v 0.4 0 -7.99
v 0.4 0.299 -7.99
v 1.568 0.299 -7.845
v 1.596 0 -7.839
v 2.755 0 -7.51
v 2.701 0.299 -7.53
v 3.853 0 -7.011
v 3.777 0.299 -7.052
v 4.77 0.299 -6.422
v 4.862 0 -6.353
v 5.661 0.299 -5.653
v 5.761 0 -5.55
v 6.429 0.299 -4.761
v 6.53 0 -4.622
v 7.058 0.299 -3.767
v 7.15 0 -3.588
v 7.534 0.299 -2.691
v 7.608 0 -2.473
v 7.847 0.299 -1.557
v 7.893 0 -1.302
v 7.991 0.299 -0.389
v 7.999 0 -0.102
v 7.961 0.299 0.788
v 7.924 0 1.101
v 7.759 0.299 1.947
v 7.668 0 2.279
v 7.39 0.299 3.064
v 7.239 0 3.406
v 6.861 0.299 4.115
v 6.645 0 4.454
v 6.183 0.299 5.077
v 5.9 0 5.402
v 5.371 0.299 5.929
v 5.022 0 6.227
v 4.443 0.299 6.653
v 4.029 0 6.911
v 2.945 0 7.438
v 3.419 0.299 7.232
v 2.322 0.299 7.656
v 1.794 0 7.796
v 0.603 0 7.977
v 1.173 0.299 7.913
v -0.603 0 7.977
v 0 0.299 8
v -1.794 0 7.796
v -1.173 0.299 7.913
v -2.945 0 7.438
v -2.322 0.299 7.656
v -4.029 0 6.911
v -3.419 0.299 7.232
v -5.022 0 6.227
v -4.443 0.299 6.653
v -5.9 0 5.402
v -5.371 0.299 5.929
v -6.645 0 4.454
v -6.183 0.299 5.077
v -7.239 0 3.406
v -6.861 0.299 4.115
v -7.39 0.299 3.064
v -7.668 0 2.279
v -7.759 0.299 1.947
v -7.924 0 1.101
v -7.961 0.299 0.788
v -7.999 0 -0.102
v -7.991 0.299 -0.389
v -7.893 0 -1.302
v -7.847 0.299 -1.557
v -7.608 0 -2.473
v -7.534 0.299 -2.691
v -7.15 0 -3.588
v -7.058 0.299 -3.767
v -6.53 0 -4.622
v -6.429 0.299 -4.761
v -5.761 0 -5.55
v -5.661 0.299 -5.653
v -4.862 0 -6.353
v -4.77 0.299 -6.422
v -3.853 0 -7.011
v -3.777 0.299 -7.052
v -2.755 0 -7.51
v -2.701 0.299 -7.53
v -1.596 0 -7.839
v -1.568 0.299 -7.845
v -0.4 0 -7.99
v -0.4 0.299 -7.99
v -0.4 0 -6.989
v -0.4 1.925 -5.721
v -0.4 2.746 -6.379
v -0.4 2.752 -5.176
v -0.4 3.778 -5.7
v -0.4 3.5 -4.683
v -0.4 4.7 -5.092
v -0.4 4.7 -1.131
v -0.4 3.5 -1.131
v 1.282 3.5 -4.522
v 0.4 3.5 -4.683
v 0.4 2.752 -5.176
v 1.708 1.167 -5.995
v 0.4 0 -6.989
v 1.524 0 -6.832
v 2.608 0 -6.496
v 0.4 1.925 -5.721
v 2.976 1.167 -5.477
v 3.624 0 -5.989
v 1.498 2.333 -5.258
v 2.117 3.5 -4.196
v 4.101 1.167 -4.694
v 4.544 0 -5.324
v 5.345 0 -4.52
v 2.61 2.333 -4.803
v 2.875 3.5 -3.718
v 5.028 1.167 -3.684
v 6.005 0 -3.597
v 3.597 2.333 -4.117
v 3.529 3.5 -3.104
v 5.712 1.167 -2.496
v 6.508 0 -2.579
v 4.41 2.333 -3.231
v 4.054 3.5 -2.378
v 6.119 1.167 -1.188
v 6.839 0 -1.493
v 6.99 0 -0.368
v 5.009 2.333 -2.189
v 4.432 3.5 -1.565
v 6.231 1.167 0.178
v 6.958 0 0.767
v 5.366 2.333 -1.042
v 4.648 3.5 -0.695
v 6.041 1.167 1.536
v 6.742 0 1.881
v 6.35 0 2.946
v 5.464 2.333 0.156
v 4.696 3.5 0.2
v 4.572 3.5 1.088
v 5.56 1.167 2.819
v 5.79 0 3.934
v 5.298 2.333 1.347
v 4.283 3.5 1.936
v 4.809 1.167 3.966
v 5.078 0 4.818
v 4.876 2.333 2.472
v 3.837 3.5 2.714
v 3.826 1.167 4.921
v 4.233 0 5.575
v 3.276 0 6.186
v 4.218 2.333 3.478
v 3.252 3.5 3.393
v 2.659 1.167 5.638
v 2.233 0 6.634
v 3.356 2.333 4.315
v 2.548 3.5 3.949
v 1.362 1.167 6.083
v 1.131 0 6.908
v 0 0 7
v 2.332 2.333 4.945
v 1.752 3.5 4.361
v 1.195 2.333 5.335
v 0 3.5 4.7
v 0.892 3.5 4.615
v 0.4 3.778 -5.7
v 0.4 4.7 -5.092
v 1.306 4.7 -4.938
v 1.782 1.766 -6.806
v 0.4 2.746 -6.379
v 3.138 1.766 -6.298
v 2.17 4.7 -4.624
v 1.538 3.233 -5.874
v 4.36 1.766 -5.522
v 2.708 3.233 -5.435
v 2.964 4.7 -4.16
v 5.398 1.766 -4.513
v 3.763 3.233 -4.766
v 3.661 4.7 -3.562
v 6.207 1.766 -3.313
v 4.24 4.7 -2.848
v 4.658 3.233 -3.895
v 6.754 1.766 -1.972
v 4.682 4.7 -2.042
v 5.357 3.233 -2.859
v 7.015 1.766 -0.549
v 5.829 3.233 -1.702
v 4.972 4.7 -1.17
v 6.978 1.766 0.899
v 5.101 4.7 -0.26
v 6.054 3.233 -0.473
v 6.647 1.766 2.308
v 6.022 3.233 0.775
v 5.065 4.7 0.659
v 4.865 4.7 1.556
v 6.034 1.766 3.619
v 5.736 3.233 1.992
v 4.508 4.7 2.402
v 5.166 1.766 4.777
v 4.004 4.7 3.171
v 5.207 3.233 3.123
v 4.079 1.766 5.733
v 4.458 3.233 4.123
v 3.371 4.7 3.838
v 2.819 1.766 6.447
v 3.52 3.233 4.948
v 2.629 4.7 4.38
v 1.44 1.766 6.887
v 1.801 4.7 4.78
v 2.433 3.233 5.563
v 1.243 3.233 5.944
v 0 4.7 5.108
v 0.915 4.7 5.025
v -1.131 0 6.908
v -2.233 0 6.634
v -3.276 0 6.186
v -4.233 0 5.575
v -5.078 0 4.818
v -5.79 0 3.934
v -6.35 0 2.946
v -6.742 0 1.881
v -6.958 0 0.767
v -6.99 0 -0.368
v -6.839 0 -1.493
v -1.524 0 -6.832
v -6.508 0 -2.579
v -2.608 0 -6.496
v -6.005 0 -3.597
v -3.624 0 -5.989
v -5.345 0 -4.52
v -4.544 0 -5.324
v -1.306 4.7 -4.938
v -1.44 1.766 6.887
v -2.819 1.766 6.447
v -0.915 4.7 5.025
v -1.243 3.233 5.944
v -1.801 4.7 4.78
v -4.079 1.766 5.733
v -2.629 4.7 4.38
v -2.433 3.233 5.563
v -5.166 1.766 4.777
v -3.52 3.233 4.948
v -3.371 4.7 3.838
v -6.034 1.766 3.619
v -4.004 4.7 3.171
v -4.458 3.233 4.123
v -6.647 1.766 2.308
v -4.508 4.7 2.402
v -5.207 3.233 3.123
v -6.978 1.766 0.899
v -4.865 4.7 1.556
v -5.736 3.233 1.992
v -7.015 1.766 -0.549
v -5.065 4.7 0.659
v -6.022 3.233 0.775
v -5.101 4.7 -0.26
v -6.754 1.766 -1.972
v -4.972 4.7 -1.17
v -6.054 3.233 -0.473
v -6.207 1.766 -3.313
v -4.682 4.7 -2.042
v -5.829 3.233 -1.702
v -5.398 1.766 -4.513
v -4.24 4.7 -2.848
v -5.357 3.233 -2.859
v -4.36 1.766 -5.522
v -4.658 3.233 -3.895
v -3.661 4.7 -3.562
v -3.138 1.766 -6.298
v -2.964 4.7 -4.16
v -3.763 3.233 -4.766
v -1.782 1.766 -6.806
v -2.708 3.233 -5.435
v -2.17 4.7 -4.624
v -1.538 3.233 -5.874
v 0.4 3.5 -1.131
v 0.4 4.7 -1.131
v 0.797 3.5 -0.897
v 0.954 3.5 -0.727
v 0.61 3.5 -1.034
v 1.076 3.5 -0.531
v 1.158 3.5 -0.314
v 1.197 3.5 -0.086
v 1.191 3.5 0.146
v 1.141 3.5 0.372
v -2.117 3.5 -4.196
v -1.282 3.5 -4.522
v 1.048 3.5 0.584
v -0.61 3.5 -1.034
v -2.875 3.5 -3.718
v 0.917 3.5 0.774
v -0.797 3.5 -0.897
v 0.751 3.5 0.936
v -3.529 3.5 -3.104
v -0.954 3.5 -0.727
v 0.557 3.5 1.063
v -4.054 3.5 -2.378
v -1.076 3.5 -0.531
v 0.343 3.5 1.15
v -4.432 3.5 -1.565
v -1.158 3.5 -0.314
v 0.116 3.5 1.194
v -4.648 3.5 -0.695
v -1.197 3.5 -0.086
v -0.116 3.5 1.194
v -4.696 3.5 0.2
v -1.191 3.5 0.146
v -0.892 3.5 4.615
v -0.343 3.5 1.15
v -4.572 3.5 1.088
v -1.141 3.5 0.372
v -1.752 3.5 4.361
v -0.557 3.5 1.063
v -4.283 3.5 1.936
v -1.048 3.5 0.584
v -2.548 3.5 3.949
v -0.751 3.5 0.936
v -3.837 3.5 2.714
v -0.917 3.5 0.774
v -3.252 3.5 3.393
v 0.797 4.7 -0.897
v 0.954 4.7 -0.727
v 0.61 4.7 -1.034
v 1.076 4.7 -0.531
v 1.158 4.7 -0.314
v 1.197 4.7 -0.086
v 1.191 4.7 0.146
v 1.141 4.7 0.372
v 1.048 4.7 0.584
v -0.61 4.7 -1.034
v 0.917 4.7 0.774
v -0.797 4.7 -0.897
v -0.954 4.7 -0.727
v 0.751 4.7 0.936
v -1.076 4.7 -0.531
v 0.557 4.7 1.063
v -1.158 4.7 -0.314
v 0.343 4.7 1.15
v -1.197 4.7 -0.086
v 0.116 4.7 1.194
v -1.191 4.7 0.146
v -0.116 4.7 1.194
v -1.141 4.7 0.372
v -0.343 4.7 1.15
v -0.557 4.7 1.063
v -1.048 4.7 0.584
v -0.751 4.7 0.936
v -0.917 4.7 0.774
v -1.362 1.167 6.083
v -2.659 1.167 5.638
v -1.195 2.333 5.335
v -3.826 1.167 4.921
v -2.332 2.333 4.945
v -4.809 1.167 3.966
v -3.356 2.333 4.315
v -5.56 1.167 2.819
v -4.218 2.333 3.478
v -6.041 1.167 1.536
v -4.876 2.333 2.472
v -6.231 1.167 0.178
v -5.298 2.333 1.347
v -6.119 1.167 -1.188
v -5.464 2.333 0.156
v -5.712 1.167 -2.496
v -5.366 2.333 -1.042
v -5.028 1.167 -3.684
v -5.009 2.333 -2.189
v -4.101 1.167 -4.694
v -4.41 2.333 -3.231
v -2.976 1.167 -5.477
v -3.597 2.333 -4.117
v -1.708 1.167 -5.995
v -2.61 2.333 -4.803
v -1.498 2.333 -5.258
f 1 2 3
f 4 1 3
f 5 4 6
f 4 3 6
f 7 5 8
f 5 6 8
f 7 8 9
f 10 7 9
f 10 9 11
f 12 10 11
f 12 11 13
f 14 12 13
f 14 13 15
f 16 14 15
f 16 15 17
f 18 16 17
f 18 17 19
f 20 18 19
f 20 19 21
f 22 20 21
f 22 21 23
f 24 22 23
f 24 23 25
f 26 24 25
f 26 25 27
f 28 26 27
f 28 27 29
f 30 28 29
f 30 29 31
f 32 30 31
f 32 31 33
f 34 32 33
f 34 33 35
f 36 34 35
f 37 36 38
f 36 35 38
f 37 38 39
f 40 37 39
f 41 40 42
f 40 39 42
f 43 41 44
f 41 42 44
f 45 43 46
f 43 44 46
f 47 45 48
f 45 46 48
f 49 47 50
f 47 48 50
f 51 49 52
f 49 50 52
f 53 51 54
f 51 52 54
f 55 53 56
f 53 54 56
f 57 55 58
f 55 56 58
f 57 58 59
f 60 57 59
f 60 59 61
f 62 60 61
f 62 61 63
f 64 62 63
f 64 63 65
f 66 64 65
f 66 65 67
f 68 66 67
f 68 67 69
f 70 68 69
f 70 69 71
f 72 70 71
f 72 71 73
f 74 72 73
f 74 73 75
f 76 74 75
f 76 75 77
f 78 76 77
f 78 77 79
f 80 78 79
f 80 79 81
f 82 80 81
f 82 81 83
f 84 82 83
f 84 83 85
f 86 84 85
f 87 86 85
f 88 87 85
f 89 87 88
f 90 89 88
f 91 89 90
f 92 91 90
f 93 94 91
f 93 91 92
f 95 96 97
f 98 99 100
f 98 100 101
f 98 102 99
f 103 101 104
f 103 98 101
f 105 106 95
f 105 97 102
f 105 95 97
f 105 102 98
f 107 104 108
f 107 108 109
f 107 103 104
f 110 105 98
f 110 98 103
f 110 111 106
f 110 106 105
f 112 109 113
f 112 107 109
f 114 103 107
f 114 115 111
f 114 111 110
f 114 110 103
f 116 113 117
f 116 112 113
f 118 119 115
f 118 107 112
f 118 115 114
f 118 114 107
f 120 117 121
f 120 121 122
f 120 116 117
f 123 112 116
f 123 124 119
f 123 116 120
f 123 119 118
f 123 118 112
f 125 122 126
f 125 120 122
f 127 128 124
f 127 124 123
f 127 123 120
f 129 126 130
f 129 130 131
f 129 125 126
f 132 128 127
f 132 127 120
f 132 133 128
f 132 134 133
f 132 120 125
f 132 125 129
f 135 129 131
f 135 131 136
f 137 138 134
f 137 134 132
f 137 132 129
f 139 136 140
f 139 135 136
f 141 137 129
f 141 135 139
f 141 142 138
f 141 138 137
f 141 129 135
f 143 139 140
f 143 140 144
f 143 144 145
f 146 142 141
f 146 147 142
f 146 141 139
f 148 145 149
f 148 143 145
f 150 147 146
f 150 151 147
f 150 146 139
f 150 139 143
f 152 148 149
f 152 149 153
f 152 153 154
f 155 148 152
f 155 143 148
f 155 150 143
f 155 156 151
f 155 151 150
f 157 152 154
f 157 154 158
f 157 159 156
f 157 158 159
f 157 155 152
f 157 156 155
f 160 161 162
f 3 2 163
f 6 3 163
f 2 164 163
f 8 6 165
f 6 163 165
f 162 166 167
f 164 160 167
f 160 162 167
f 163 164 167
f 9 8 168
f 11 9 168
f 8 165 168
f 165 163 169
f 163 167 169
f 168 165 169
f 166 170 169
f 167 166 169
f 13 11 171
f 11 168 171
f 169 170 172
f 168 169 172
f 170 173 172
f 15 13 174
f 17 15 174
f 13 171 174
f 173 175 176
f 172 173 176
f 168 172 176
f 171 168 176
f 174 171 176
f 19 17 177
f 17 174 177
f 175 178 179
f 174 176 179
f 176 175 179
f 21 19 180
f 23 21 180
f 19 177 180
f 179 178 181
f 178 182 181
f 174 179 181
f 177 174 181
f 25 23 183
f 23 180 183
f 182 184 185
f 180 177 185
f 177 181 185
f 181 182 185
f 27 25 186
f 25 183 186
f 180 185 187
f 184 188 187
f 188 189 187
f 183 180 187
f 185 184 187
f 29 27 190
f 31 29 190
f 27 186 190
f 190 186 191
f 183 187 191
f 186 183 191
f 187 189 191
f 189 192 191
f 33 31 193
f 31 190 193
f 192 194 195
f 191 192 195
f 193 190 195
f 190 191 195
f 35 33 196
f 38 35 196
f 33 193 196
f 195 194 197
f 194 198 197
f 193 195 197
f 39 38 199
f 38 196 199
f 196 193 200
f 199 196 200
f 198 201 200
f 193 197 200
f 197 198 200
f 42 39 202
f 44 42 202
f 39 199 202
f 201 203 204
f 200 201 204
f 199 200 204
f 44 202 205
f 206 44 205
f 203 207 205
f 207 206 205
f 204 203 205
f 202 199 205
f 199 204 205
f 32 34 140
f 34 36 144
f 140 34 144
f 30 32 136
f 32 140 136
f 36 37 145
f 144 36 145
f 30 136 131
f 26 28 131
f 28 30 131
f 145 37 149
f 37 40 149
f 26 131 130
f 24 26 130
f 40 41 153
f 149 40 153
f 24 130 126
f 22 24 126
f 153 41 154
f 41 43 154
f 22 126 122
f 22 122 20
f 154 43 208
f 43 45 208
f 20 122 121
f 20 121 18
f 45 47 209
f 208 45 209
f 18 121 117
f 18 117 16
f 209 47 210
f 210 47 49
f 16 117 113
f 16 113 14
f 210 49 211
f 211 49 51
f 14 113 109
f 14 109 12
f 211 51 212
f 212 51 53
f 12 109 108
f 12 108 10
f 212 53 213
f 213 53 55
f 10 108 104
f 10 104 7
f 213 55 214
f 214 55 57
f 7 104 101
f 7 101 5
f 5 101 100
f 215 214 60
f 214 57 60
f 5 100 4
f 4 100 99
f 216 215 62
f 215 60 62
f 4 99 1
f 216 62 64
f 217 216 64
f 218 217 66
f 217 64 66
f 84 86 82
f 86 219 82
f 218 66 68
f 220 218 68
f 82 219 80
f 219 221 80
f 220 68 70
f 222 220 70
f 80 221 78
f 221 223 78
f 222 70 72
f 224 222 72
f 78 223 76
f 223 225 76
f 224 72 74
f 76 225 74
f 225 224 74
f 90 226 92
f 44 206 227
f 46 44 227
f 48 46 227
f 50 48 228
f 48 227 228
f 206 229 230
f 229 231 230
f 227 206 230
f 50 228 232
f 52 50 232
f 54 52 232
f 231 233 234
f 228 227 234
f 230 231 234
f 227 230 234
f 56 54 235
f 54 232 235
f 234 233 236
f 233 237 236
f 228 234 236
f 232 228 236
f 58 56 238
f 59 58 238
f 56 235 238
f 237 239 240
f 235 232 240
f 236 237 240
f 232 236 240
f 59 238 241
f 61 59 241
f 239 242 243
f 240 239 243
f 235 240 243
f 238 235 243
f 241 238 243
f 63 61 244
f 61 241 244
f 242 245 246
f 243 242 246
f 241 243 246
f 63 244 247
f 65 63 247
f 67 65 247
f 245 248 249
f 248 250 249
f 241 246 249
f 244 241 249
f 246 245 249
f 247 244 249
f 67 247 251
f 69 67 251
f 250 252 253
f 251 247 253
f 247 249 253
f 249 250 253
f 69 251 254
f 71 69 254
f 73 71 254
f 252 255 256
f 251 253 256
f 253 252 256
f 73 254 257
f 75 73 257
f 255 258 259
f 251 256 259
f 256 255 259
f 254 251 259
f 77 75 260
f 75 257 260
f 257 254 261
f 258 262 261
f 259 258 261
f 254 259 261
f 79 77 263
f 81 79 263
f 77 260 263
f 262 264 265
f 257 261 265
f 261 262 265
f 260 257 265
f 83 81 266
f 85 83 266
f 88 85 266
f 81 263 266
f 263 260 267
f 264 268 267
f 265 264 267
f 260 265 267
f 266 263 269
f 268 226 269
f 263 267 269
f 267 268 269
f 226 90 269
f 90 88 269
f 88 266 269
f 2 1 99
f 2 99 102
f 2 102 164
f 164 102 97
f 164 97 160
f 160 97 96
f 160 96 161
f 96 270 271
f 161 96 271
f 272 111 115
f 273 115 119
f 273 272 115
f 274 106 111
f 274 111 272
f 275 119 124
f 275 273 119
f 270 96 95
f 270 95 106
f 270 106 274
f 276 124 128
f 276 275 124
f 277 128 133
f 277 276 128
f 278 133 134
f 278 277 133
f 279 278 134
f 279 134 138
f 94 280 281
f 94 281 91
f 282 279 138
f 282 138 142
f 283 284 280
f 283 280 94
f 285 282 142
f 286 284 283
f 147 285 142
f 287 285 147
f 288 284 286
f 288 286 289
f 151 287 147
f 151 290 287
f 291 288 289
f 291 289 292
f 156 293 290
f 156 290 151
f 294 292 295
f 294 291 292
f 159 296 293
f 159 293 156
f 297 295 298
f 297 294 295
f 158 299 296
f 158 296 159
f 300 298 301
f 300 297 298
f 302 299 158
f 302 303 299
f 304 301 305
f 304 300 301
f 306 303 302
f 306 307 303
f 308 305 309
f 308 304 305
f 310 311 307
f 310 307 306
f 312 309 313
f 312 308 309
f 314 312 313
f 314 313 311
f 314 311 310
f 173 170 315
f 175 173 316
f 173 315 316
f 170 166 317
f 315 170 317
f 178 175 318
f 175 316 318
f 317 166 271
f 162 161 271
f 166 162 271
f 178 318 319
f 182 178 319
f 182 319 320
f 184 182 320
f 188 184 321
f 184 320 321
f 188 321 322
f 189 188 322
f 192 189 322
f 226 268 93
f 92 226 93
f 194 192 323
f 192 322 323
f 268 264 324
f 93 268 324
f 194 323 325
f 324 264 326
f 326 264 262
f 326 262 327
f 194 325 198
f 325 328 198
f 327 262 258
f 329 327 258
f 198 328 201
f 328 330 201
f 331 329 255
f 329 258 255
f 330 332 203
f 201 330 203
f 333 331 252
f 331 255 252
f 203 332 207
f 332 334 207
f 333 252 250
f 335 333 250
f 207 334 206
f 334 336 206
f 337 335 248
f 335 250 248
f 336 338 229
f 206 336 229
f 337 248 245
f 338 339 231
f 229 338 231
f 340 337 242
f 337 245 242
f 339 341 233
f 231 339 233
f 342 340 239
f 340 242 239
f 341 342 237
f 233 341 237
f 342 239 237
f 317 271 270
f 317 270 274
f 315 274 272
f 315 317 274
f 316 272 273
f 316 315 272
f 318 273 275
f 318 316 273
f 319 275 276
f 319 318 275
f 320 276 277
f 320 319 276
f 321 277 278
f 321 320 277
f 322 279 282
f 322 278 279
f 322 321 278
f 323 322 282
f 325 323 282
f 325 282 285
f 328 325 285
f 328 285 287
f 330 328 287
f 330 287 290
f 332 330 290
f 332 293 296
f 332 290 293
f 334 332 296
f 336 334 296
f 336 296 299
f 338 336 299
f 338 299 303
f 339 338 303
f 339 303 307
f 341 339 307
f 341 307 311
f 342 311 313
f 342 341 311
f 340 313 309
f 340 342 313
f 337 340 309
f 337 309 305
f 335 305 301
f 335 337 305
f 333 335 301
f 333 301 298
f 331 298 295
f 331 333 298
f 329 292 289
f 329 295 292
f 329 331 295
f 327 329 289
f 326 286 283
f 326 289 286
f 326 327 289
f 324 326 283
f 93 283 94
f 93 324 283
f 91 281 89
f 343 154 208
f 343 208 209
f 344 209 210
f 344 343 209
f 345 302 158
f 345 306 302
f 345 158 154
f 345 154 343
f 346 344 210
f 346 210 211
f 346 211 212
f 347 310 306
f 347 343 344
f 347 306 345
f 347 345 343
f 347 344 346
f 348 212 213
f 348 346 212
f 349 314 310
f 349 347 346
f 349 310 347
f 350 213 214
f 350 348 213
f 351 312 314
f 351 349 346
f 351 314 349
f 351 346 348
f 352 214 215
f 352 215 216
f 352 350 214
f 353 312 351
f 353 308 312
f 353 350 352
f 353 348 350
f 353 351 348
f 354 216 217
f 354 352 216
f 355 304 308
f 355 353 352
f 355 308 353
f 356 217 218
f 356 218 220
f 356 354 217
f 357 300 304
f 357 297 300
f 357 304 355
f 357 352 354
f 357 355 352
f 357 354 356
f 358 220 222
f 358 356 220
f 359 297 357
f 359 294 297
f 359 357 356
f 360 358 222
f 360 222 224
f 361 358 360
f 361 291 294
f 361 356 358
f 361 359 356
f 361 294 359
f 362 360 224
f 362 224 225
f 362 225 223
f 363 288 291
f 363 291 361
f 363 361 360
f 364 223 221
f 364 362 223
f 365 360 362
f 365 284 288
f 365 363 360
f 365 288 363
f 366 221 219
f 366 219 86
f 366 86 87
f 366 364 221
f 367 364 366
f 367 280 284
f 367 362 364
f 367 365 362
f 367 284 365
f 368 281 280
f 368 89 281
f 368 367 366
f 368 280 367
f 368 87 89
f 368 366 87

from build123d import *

# Parameters (mm, degrees)
SKETCH_4_W          = 0.8
SKETCH_4_H          = 5.94447729
CUT_EXTRUDE_1_DEPTH = 10


with BuildPart() as part:
    # 草图2 → 旋转1 (revolve)
    with BuildSketch(Plane.XY, mode=Mode.PRIVATE) as revolve_1_sk:
        Polygon((0, 0), (8, 0), (8, 0.299164486), (5.108022377, 4.7), (0, 4.7), align=None)
    revolve(revolve_1_sk.sketch.rotate(Axis((0, 6.286953345, 0), (0, -1, 0)), 90), axis=Axis((0, 6.286953345, 0), (0, -1, 0)))

    # 草图3 → 切除-旋转1 (revolve, cut)
    with BuildSketch(Plane.XY, mode=Mode.PRIVATE) as cut_revolve_1_sk:
        Polygon((1.2, 3.5), (1.2, 6.5), (0, 6.5), (0, 0), (7, 0), (4.7, 3.5), align=None)
    revolve(cut_revolve_1_sk.sketch.rotate(Axis((0, 5.949565502, 0), (0, -1, 0)), 90), axis=Axis((0, 5.949565502, 0), (0, -1, 0)), mode=Mode.SUBTRACT)

    # 草图4 → 切除-拉伸1 (cut)
    with BuildSketch(Plane.XY):
        with Locations((0, 2.524530629)):
            Rectangle(SKETCH_4_W, SKETCH_4_H)
    extrude(amount=-CUT_EXTRUDE_1_DEPTH, mode=Mode.SUBTRACT)


solid = part.part
